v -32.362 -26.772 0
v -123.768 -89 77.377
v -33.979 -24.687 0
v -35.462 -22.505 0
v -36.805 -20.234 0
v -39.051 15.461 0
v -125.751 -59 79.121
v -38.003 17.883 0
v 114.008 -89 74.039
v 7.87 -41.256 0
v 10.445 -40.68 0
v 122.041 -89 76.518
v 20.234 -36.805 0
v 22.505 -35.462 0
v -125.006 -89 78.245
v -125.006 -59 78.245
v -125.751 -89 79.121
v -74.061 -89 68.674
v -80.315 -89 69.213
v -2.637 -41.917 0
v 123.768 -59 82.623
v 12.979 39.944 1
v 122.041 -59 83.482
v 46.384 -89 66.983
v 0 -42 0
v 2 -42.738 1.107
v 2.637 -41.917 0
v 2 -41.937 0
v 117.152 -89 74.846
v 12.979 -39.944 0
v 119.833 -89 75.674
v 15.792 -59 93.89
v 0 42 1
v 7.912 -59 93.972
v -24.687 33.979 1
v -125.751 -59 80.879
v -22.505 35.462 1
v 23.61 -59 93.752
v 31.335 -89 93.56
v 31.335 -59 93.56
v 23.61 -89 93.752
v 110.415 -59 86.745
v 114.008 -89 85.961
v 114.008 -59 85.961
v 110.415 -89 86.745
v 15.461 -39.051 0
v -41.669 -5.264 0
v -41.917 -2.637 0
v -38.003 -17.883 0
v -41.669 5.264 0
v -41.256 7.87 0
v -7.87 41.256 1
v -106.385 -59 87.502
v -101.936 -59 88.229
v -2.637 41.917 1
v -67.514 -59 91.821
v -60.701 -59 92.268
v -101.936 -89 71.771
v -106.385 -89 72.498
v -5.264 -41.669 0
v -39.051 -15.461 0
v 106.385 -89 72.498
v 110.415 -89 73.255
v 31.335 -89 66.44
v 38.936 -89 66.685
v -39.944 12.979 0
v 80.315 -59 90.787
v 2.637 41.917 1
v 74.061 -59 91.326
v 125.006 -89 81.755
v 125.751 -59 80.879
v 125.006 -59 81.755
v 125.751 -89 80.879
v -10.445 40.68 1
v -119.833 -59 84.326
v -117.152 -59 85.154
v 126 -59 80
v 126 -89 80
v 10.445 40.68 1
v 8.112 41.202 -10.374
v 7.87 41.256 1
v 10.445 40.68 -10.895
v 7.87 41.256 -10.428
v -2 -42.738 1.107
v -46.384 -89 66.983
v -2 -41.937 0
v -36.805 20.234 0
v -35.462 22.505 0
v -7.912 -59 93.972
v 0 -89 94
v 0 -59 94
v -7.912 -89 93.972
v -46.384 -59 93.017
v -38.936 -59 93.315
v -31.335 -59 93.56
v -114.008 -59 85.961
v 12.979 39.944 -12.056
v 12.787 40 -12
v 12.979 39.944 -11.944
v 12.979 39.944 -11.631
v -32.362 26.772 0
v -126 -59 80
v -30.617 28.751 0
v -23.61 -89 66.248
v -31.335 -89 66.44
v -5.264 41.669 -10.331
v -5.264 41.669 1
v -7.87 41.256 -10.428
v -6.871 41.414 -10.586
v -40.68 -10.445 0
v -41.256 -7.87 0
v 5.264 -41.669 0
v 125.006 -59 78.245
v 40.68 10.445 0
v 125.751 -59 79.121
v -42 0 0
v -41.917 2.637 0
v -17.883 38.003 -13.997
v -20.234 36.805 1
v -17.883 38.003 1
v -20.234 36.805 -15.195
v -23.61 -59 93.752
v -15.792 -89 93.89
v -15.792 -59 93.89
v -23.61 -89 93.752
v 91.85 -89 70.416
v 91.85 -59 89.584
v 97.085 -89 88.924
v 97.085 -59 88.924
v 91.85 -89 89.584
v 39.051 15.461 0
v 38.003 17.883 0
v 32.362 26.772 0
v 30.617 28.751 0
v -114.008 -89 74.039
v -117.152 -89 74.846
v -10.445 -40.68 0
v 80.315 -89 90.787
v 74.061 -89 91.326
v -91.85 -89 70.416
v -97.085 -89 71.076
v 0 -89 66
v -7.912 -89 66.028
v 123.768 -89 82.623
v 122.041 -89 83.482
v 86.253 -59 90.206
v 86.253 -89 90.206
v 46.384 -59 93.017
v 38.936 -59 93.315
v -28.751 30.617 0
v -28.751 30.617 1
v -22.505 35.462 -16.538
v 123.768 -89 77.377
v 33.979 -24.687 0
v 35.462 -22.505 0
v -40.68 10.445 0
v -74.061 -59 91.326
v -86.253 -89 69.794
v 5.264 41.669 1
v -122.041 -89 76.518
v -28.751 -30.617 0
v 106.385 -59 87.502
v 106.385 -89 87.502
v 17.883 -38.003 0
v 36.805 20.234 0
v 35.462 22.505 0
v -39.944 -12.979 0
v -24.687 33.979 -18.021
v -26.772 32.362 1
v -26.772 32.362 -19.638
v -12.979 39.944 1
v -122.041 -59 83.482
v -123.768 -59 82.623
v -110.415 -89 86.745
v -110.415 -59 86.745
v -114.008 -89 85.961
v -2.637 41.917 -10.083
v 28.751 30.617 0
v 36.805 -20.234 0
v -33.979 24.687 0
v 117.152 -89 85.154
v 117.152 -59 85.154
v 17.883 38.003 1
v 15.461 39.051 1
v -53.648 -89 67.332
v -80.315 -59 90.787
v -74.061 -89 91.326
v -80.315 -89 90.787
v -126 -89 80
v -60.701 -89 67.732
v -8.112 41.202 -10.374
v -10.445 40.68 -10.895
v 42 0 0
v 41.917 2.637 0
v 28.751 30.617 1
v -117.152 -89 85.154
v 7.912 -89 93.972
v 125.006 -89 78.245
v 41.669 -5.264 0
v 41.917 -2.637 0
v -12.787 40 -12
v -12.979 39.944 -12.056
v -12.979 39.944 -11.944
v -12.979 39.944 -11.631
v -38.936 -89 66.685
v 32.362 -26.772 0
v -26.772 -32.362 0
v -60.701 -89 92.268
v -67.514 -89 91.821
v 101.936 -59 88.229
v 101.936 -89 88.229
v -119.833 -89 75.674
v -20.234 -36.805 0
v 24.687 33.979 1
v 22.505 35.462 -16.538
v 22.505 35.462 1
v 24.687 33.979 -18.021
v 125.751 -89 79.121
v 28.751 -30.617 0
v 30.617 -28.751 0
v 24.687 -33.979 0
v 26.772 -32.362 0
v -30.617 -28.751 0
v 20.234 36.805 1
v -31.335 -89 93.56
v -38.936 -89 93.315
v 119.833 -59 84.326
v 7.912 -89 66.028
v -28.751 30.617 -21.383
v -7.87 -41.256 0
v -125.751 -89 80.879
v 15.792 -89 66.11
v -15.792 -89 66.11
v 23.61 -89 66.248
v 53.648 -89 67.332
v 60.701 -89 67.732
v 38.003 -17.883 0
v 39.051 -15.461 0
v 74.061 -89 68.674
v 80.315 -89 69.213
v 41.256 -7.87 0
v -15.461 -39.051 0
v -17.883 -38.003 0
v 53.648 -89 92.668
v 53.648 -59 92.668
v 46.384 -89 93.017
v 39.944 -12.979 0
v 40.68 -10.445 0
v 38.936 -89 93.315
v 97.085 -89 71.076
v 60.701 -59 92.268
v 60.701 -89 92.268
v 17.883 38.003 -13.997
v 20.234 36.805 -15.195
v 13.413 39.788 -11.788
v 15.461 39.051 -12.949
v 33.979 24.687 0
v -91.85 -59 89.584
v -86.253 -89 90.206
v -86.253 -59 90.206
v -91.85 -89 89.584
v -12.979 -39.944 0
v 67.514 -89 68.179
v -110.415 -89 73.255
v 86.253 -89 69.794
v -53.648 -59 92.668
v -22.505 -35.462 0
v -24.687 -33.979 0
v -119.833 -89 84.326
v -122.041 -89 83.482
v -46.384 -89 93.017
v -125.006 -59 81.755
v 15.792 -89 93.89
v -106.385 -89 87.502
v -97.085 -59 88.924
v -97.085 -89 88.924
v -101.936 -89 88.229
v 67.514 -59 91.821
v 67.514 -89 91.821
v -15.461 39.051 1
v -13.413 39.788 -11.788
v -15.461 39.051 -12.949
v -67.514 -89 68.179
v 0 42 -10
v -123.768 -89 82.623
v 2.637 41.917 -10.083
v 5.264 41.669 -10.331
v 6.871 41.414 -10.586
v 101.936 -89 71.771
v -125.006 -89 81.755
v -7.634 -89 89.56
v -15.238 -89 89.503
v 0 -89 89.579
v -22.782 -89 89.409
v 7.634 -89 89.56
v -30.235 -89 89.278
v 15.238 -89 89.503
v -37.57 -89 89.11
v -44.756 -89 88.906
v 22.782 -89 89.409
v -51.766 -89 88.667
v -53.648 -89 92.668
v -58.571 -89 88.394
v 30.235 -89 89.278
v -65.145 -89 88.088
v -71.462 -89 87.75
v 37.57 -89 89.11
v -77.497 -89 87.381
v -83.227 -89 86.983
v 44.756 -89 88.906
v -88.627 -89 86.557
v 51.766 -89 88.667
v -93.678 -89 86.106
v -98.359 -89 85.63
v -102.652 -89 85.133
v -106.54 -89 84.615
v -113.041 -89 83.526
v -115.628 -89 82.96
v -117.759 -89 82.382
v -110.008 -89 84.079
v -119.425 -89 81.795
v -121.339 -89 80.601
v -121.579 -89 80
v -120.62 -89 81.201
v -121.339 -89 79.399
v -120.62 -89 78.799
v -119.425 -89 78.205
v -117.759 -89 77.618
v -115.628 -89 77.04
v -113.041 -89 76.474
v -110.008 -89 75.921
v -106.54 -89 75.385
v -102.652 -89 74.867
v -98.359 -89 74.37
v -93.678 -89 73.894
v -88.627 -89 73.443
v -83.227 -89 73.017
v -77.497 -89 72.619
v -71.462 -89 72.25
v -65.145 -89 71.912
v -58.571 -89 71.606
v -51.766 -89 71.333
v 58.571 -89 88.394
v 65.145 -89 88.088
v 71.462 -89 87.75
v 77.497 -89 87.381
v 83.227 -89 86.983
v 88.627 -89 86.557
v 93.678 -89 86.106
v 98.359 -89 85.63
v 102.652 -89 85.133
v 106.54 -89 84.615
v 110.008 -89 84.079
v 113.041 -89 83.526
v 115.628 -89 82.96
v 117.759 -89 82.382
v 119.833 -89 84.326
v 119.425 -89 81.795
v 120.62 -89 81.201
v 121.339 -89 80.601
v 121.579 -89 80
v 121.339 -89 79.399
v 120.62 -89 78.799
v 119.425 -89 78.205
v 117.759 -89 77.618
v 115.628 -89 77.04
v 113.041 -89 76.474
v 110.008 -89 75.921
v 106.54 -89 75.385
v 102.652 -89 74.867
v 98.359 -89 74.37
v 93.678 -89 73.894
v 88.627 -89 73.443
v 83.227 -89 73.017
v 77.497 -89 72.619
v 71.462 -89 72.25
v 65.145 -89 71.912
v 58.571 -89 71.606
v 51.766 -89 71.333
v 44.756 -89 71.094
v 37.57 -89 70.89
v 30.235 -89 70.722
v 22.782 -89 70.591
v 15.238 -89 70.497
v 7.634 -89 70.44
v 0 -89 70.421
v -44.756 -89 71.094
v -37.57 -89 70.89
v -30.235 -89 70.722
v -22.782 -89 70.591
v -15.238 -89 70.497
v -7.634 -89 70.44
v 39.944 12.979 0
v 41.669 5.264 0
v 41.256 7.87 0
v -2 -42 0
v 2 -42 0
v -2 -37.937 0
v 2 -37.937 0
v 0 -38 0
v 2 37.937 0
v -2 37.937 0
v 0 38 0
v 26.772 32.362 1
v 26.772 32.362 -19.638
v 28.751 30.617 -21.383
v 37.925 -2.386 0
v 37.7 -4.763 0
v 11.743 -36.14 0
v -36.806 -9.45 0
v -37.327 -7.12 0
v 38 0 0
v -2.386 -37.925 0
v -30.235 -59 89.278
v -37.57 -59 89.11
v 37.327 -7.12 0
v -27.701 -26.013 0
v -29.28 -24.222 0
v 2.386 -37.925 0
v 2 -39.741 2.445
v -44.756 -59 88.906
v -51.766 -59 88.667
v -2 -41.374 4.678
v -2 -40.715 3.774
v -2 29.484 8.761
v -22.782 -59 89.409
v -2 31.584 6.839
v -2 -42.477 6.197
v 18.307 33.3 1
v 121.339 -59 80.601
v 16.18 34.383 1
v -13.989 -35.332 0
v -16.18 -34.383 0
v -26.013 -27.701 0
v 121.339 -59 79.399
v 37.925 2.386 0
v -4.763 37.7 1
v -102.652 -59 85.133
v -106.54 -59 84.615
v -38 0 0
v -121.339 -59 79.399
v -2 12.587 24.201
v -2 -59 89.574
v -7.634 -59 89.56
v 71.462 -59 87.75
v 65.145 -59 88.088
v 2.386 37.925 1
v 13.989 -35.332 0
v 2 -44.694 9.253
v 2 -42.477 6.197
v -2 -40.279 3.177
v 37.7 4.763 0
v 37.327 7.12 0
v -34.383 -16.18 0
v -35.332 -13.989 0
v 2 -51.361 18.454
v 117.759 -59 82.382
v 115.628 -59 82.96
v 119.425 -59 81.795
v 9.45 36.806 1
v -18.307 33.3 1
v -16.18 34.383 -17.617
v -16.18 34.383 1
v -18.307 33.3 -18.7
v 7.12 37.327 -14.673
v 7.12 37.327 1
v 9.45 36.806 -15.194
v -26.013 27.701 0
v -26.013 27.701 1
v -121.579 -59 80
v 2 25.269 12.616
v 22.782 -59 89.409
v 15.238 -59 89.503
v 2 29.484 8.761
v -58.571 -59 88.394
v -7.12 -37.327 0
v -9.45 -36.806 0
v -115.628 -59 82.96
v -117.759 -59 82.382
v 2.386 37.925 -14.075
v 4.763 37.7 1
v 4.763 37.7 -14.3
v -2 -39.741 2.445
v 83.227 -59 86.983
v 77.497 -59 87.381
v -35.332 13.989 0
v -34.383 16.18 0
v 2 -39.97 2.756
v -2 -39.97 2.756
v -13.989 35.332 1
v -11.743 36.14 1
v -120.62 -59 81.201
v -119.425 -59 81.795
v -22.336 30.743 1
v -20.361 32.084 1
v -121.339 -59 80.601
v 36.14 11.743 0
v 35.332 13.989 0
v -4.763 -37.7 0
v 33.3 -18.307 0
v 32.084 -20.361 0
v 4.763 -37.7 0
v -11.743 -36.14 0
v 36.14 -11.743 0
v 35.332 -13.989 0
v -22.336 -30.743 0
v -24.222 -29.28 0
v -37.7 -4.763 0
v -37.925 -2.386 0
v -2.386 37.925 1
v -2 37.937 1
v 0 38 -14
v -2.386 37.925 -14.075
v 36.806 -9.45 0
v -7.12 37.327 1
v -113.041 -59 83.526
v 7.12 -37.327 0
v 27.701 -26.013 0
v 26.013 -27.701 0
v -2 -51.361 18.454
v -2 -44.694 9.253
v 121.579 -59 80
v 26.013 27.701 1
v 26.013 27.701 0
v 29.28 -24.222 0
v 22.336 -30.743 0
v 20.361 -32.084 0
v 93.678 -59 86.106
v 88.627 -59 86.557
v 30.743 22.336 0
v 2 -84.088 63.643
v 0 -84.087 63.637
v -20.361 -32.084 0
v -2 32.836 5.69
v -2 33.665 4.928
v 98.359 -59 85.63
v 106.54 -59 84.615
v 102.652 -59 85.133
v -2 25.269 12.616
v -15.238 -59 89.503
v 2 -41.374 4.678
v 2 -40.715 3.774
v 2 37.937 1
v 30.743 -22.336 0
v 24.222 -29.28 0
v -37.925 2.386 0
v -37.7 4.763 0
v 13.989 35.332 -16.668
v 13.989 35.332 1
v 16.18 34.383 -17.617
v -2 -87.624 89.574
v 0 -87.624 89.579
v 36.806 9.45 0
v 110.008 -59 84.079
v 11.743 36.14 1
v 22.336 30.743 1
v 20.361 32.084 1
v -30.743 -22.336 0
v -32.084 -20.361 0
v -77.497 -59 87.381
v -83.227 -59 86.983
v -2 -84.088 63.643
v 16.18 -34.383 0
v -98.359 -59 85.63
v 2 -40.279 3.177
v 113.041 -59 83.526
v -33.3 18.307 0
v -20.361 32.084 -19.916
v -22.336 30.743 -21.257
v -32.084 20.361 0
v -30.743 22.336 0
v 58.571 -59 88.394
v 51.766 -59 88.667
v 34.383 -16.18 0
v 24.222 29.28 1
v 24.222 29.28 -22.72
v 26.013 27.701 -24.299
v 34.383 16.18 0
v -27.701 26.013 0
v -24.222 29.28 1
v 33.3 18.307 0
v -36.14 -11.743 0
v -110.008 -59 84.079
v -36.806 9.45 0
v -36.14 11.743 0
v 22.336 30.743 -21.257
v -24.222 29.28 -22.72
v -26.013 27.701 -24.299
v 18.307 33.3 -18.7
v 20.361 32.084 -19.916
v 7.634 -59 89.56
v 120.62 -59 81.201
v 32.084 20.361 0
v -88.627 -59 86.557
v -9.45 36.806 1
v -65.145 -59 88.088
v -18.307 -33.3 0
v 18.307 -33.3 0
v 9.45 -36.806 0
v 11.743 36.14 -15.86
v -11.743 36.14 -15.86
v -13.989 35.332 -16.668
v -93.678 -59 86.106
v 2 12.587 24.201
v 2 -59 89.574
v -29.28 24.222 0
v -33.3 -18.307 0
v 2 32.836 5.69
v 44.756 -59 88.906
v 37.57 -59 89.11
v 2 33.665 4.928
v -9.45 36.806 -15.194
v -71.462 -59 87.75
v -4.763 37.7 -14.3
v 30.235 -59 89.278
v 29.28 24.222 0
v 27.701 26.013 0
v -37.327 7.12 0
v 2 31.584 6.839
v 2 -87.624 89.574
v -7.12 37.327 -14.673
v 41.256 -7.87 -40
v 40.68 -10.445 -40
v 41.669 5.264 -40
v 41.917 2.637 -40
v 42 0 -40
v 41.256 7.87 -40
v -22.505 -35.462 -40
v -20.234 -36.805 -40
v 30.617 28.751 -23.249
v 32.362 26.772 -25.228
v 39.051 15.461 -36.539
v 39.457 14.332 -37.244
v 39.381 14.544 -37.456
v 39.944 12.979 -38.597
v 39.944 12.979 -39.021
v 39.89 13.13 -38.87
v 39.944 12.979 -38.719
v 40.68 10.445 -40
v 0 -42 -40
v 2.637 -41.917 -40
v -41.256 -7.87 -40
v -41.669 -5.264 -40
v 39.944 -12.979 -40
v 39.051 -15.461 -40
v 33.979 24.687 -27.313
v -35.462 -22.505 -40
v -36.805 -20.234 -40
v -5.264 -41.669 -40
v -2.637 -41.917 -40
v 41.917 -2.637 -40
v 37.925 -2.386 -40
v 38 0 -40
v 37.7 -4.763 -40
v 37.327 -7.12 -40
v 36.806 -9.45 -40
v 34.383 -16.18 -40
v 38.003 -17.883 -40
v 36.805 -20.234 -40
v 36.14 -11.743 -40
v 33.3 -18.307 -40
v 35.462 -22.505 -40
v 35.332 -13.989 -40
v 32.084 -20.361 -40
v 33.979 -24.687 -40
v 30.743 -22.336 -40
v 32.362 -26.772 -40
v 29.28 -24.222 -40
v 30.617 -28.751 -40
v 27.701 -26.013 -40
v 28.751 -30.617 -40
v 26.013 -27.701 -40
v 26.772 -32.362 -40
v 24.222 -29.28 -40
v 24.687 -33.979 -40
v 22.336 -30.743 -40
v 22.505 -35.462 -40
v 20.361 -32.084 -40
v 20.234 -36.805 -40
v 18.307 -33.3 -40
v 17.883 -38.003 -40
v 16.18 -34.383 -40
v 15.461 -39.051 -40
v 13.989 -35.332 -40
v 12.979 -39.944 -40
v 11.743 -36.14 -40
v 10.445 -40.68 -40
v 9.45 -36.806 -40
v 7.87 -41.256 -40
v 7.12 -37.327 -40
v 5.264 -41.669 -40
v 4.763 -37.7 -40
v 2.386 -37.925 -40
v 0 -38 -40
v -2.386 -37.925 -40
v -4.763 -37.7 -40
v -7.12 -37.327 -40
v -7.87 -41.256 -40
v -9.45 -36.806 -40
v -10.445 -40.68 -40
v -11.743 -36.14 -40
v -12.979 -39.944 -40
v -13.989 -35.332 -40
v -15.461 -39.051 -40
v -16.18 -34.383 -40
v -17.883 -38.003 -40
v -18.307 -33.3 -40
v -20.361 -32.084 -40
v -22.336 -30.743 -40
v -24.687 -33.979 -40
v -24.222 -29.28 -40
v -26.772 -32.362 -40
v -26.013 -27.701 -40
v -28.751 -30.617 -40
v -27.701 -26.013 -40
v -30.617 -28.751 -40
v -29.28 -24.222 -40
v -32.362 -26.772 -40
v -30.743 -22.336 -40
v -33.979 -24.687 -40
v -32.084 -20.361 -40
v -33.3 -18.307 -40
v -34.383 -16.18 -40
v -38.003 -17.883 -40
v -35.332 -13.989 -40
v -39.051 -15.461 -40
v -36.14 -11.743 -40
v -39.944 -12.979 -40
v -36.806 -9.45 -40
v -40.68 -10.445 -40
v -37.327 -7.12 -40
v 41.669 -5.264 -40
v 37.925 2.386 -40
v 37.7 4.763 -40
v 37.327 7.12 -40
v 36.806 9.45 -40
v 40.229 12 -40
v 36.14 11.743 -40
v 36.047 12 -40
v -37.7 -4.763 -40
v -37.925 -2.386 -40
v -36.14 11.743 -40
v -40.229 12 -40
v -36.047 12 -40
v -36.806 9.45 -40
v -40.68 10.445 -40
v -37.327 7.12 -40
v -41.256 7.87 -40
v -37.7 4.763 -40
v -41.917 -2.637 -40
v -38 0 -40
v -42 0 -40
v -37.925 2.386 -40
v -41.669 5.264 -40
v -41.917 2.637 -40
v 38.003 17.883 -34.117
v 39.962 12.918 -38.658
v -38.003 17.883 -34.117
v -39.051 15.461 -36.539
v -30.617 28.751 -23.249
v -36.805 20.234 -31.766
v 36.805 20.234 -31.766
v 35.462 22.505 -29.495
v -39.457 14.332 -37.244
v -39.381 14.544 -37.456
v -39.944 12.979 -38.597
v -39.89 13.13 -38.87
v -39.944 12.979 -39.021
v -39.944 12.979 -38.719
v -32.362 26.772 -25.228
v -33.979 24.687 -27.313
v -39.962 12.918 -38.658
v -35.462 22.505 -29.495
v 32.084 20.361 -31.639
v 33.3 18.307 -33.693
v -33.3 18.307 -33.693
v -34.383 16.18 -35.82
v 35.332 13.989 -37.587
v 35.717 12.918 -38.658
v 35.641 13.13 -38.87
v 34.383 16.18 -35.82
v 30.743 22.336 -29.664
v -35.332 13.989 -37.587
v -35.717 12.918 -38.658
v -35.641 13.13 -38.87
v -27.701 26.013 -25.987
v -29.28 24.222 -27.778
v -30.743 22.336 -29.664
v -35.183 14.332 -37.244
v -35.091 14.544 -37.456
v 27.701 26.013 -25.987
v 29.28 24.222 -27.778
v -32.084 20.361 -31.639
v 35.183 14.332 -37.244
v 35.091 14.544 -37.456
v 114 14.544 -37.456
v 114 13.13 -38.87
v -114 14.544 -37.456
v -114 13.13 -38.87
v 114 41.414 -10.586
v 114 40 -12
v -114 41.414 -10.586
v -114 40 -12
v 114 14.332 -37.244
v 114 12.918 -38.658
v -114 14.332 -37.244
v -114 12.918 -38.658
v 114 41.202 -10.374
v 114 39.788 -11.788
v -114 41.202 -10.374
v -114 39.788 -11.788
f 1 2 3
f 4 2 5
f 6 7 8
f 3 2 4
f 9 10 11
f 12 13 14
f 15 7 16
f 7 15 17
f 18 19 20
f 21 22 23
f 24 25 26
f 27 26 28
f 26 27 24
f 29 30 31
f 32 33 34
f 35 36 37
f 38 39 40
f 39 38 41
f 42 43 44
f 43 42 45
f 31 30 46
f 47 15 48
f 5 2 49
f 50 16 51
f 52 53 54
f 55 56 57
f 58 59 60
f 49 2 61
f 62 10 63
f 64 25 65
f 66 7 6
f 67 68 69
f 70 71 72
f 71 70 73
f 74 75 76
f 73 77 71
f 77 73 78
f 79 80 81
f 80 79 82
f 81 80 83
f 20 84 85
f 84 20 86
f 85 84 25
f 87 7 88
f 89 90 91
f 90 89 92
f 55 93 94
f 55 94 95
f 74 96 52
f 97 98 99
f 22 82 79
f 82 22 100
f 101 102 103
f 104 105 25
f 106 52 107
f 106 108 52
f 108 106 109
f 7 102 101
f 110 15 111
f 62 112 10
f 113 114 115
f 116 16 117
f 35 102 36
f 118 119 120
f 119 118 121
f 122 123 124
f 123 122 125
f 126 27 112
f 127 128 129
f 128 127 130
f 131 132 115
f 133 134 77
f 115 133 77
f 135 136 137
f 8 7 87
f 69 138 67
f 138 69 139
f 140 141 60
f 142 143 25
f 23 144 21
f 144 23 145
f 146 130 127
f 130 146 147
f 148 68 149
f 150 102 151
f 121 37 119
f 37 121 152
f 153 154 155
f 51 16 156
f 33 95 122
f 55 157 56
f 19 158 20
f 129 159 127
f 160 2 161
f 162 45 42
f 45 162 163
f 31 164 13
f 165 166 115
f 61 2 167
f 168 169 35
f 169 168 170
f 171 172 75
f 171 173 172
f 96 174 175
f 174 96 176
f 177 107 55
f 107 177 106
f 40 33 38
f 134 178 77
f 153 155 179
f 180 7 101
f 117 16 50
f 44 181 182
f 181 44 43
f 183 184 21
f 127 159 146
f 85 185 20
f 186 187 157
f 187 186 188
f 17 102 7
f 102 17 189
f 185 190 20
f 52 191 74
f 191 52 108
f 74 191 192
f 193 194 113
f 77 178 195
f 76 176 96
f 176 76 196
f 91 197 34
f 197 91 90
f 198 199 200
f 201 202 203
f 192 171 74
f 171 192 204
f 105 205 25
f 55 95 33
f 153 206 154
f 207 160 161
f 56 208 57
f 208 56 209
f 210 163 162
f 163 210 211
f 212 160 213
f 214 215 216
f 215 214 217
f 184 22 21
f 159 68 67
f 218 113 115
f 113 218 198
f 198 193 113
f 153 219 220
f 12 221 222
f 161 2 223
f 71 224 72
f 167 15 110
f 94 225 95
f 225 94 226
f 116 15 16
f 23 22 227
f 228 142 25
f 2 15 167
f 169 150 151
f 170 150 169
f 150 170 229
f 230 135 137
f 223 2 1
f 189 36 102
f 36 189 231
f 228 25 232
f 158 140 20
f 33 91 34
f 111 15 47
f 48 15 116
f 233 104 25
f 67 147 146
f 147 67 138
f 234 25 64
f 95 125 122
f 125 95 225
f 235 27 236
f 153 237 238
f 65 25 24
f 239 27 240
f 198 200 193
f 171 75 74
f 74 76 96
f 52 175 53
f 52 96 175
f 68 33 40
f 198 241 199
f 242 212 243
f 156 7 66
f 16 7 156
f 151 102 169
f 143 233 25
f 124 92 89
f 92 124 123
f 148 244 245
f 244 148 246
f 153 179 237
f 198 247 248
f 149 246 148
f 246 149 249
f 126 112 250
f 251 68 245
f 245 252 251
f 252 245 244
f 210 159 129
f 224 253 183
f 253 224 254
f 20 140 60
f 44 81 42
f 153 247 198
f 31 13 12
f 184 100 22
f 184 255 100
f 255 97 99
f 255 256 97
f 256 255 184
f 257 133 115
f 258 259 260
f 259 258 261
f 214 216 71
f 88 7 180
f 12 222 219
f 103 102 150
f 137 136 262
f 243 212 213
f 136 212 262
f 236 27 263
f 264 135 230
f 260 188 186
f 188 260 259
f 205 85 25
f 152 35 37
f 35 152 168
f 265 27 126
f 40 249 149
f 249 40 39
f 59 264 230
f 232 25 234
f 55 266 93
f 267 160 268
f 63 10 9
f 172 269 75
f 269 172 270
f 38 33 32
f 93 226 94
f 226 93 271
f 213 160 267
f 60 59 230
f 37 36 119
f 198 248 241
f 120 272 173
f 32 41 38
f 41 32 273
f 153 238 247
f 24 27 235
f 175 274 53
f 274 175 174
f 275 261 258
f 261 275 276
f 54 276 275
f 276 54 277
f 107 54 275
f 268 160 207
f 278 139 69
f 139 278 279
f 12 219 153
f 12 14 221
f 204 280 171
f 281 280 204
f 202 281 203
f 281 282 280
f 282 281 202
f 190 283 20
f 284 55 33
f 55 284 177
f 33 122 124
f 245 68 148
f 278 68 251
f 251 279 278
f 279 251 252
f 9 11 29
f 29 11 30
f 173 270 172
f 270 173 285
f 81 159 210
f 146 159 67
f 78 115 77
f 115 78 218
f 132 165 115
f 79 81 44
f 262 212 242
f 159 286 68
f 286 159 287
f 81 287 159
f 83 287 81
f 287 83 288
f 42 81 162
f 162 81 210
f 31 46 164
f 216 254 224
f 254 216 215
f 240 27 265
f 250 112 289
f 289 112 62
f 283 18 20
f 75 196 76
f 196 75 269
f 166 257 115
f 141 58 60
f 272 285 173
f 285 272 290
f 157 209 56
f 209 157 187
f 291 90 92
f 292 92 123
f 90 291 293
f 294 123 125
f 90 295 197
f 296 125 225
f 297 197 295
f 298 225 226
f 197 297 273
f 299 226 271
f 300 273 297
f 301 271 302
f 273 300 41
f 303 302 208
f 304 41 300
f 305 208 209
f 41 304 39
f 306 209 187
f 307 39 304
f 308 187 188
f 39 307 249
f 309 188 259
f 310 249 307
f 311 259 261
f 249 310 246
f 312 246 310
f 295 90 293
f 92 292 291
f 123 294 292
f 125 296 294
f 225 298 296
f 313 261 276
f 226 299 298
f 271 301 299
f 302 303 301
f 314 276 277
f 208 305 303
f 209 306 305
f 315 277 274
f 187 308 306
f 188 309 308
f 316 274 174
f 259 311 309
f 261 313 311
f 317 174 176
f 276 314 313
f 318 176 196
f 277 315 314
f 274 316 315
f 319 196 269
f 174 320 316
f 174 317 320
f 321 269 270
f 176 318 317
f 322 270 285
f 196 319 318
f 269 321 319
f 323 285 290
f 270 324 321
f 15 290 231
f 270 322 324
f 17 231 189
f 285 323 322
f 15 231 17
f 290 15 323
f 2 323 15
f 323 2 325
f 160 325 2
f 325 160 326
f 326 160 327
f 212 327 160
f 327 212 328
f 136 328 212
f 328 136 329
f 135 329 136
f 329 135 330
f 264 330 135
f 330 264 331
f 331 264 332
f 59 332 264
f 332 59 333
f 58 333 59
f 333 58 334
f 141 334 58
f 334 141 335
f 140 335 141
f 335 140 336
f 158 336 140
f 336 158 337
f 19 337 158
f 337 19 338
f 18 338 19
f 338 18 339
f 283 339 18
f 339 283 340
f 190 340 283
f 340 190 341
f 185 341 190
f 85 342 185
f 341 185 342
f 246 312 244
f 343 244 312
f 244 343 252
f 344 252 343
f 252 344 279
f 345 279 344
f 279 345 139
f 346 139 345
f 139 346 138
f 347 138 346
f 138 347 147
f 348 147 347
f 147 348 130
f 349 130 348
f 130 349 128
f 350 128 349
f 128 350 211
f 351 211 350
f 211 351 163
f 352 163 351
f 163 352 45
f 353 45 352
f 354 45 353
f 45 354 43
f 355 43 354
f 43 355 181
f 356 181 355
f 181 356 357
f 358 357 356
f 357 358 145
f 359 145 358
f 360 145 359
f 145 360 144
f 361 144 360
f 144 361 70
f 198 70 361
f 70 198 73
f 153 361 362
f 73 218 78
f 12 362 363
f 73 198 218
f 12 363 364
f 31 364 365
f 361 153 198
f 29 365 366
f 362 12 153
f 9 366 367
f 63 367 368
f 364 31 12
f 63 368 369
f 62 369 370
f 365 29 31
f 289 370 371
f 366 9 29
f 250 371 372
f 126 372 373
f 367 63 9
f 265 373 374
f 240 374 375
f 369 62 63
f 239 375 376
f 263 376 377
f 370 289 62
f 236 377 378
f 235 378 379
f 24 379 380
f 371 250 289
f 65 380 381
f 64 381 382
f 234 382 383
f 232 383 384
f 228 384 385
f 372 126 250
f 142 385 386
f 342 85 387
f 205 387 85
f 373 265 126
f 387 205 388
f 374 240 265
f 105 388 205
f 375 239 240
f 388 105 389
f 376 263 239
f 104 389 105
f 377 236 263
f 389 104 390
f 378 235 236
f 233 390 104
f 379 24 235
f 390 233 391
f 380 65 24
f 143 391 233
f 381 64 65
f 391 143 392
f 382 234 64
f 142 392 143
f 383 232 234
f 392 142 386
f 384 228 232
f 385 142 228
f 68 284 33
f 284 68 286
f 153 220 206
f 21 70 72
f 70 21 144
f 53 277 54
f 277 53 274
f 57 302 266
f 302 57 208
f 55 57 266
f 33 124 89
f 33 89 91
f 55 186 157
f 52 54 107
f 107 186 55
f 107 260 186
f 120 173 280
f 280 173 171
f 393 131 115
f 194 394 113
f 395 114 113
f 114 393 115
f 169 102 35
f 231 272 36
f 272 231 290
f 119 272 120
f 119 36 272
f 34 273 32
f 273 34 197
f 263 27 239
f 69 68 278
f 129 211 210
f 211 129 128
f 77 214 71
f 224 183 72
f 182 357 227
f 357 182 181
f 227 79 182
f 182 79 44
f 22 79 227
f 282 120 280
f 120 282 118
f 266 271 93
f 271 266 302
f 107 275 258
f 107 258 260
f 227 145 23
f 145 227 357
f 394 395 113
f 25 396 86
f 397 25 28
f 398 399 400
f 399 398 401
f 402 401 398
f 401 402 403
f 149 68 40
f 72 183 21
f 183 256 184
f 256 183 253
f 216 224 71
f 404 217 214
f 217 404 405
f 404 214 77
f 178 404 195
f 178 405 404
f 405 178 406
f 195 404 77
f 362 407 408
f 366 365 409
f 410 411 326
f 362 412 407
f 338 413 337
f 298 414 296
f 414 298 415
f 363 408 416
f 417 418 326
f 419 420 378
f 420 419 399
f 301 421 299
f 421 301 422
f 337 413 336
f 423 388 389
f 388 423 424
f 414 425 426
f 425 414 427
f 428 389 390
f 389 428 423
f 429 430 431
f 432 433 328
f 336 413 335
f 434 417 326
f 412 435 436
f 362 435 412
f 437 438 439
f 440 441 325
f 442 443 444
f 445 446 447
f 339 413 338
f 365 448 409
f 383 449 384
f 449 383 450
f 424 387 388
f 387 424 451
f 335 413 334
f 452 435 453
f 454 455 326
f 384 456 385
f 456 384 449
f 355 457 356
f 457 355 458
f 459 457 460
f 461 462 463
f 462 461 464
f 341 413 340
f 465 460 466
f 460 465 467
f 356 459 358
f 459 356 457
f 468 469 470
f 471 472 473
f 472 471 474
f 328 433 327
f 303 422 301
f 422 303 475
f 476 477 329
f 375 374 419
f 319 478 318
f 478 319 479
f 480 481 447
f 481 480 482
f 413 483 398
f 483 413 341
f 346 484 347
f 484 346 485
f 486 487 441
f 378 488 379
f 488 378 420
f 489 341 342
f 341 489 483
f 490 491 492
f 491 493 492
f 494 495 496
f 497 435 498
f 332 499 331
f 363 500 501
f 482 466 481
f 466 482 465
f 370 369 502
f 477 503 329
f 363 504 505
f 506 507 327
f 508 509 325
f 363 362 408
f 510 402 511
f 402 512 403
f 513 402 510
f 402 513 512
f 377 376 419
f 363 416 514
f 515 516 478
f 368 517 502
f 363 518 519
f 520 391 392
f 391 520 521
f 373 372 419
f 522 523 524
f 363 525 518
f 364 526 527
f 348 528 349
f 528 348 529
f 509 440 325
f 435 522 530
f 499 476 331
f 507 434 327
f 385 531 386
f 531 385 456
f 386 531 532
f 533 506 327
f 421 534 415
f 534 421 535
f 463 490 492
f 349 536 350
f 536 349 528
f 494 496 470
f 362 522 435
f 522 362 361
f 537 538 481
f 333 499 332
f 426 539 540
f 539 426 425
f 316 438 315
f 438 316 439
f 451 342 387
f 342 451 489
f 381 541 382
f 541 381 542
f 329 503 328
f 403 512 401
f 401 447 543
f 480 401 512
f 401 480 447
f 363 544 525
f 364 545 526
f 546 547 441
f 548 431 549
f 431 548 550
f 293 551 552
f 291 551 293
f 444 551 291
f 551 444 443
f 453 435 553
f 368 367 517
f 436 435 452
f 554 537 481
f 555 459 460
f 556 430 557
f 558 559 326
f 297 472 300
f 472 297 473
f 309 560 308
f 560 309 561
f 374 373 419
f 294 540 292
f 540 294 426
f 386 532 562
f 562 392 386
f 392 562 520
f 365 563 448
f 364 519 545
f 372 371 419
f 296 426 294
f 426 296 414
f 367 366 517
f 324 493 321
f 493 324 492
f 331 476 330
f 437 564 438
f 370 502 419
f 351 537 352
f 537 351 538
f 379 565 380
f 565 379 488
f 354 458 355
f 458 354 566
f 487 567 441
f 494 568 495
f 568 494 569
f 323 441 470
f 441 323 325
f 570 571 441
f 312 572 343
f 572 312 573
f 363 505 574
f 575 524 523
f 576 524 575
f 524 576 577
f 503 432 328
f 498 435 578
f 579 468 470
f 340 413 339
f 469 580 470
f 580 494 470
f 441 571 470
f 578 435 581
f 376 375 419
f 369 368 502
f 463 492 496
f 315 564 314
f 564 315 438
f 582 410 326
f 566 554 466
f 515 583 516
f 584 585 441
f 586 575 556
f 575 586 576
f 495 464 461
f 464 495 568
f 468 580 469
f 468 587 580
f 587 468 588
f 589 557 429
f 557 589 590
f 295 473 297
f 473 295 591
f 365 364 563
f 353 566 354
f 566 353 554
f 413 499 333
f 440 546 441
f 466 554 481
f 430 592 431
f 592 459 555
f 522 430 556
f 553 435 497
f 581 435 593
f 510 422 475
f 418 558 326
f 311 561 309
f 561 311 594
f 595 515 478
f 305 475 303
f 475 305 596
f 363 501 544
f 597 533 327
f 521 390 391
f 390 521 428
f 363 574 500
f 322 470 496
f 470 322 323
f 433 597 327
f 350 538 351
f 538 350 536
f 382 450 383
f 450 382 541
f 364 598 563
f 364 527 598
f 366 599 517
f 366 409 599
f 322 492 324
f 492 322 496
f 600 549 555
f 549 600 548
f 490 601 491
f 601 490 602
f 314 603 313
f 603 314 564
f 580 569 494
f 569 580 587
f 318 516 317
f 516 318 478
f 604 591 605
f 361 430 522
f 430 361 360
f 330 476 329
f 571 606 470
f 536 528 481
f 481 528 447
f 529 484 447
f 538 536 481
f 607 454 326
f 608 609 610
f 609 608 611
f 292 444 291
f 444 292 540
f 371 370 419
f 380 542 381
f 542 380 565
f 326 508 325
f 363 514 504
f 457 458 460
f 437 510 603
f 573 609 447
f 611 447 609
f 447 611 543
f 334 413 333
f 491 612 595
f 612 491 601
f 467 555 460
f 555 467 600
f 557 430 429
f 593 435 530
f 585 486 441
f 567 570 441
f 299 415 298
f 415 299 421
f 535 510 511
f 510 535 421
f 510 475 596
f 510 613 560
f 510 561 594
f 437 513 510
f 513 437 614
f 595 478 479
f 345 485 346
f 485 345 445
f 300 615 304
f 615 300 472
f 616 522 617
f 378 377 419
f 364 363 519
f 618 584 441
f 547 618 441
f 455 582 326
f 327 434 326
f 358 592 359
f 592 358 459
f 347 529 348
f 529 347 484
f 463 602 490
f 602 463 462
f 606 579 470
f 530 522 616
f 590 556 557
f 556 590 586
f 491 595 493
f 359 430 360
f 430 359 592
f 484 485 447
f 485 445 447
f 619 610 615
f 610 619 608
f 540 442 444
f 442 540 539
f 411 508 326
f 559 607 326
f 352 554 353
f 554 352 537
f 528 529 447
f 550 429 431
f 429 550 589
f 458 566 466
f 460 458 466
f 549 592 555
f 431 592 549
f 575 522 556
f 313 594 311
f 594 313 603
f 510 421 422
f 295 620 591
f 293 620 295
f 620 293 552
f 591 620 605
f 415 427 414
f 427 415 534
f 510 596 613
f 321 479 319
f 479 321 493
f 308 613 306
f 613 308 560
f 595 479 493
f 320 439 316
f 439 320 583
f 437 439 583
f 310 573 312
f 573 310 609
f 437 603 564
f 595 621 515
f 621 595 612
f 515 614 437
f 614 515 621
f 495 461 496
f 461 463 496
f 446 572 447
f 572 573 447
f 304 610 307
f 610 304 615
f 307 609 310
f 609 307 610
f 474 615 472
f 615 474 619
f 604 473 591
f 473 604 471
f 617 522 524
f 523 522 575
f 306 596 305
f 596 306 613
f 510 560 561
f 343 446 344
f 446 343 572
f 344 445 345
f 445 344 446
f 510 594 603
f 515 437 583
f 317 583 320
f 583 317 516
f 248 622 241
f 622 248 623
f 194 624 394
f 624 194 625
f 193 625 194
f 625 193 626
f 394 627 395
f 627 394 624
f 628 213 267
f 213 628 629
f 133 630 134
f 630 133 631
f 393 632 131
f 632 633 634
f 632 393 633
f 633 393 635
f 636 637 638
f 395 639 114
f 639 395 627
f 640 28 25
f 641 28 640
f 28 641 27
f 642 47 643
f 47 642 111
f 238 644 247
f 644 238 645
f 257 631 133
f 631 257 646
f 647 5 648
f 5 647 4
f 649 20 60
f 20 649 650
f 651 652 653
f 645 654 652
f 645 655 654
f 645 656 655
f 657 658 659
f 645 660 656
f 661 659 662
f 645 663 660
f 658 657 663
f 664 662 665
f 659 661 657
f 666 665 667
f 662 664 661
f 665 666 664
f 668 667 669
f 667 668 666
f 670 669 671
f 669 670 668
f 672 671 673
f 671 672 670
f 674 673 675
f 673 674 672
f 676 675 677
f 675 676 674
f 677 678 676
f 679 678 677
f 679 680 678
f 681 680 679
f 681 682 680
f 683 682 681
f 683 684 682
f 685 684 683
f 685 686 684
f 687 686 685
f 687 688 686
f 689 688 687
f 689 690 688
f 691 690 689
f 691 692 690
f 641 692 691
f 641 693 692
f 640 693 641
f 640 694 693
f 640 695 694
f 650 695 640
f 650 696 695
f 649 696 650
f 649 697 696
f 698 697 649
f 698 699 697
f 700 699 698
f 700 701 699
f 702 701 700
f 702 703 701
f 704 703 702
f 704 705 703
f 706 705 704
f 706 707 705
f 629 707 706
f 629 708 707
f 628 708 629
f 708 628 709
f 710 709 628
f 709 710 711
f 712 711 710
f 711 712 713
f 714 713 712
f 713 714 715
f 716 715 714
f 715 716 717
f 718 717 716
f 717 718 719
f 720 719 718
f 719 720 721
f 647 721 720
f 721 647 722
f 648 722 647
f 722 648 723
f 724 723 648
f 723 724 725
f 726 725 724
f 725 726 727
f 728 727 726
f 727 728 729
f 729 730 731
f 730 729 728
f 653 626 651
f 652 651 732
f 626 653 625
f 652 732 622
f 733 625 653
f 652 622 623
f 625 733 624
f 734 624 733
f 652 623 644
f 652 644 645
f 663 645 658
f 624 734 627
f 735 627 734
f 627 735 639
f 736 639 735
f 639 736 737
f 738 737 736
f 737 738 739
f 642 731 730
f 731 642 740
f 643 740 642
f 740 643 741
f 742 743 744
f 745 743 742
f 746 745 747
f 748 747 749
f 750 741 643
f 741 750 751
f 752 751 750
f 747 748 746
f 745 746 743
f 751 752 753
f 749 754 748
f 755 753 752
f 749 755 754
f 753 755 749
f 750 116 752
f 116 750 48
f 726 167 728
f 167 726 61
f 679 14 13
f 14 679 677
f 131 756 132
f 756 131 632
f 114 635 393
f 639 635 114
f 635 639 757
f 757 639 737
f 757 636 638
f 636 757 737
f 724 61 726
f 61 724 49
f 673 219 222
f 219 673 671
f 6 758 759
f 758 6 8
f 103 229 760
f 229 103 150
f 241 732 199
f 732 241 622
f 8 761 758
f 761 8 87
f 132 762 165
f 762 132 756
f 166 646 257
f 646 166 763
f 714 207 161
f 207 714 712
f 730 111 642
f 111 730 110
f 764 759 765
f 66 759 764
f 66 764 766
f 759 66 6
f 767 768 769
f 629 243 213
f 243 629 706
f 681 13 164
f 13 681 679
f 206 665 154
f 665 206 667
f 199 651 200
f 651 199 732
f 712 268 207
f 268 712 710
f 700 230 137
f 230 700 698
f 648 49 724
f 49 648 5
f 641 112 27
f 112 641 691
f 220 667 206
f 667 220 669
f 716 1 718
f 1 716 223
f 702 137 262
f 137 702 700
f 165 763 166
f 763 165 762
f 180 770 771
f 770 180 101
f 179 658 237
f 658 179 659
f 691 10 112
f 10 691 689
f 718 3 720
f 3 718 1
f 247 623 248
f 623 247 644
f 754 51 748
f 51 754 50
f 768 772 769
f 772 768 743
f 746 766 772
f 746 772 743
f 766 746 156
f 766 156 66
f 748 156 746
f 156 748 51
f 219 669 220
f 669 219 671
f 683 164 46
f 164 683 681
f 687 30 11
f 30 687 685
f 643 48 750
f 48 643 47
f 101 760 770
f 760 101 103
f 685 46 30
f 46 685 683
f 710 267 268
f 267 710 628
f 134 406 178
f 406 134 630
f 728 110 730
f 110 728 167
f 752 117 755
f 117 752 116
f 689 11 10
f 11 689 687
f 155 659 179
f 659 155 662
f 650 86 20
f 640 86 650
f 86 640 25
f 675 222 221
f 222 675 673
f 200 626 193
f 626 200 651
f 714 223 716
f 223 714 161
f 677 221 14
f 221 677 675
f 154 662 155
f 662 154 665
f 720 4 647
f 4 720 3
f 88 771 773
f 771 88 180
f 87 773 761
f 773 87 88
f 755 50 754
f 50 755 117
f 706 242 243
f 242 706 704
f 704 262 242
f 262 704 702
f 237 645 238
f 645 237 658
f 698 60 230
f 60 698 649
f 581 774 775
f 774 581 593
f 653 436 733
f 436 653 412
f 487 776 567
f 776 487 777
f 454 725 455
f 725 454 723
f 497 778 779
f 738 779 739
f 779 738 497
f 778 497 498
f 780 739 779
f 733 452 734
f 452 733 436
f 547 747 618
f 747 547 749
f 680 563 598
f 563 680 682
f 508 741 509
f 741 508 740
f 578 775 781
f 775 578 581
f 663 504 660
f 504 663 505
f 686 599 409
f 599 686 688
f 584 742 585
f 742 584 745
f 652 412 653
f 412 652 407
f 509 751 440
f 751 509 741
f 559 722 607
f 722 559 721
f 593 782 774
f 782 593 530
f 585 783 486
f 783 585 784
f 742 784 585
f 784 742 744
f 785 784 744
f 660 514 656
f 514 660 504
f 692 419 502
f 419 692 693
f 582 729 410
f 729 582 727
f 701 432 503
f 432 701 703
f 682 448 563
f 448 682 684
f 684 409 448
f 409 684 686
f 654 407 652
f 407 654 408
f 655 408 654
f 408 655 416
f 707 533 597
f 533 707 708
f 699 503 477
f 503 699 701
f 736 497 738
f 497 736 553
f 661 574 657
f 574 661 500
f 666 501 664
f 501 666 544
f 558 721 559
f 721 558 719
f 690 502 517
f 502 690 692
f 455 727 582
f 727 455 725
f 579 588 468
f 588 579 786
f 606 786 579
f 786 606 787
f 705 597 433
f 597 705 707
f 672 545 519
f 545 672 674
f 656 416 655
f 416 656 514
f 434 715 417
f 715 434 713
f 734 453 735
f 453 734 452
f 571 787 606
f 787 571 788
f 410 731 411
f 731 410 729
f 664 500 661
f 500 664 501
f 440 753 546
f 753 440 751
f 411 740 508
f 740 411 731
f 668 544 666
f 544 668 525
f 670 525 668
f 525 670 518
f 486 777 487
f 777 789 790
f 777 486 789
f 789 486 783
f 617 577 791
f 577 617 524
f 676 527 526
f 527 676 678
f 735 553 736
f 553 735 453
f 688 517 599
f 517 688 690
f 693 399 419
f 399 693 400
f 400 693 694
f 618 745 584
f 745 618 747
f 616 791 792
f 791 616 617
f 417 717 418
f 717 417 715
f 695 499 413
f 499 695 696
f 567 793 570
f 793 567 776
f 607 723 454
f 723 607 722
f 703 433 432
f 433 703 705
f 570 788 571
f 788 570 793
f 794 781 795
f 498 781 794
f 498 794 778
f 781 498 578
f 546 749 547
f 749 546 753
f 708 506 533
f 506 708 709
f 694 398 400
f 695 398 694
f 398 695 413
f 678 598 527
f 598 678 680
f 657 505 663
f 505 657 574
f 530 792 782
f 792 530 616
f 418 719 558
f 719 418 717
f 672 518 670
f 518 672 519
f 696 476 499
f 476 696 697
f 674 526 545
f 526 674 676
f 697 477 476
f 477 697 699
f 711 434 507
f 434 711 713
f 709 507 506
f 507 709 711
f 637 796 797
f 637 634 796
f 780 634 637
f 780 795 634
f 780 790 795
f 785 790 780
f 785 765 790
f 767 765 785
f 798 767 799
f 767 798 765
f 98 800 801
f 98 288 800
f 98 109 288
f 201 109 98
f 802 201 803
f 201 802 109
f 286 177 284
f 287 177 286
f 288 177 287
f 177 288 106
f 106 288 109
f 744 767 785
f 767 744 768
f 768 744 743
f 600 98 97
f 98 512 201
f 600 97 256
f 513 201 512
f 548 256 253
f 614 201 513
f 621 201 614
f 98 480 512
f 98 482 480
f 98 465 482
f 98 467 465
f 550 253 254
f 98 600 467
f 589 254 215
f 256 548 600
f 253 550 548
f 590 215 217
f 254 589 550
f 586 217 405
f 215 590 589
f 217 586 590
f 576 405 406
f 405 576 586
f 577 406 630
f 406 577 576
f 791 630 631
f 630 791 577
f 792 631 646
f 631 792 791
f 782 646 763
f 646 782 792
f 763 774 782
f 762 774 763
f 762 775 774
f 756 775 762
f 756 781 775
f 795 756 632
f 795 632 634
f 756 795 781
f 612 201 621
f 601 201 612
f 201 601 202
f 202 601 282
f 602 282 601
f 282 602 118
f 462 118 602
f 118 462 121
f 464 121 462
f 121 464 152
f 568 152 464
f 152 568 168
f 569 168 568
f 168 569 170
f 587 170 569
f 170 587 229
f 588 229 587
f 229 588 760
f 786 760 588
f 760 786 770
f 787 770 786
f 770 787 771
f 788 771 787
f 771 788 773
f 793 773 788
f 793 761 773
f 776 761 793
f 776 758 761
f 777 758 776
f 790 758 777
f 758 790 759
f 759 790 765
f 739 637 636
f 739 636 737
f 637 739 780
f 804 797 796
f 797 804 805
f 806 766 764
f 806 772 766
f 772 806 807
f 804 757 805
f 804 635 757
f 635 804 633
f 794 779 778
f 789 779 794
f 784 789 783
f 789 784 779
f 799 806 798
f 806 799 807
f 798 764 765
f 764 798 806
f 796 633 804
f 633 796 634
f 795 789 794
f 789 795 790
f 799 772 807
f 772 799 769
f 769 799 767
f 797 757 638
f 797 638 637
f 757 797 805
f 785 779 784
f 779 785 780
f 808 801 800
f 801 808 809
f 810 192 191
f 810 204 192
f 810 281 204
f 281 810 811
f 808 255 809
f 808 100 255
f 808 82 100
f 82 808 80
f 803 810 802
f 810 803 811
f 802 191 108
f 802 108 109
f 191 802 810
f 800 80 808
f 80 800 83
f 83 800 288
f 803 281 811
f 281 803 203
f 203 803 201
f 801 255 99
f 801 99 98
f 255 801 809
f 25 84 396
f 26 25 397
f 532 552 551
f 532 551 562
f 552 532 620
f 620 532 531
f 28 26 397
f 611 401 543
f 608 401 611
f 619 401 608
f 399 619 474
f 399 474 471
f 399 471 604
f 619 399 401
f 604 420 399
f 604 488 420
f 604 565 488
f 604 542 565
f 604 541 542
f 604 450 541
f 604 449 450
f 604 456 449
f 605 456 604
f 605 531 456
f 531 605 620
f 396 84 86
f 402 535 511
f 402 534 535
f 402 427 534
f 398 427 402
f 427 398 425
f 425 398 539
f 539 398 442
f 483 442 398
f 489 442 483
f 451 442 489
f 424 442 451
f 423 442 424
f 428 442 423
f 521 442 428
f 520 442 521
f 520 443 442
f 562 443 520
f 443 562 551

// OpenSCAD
pipeOD = 76;
minPipeOverlap = 10;
pipeOverlap = 40;
wallThickness = 4;
faceDepth = 30;
faceSquashFactor = 3;
faceForward = 10;
$fn=100;

difference() {
    // outer shell from the top of the pipe to the face
    hull() {
        cylinder(h = 1, r = pipeOD/2+wallThickness);
        
        rotate([90,0,0])
        translate([0,80,faceDepth+pipeOD/4+faceForward])
        scale([faceSquashFactor, 1/faceSquashFactor, 1])
        cylinder(h=faceDepth, r=pipeOD/2+wallThickness);
    }

    // inner shell for the airflow path
    hull() {
        cylinder(h = 1, r = pipeOD/2);
        
        rotate([90,0,0])
        translate([0,80,faceDepth+pipeOD/4+faceForward])
        scale([faceSquashFactor*(pipeOD/2-wallThickness/faceSquashFactor)/(pipeOD/2), 1/faceSquashFactor*(pipeOD/2-wallThickness*faceSquashFactor)/(pipeOD/2), 1])
        cylinder(h=faceDepth, r=pipeOD/2+wallThickness);
    }
};

// angled base for 3d printing and pipe connection
difference() {
    translate([0,0,-pipeOverlap])
    difference() {
        cylinder(h = pipeOverlap, r = pipeOD/2+wallThickness);
        cylinder(h = pipeOverlap, r = pipeOD/2);
    }

    translate([0, pipeOD/2+wallThickness, -minPipeOverlap])
    rotate([-45,0,0])
    translate([-pipeOD,0,-pipeOD*2])
    cube(pipeOD*2);
    
}


// internal brace to keep the face from squashing
// these dimensions are wrong
#hull() {
translate([-wallThickness/2, -pipeOD/2-wallThickness, 0])
#cube([wallThickness, pipeOD+wallThickness, 1]);

translate([-wallThickness/2,-80-wallThickness*2, faceDepth+pipeOD/4+faceForward+pipeOD/faceSquashFactor+wallThickness*2])
cube([wallThickness, faceDepth-wallThickness, 1]);
    translate([-wallThickness/2,-80-wallThickness, faceDepth+pipeOD/4+faceForward+wallThickness])
cube([wallThickness, faceDepth+1, 1]);
    
}


// base lines to get a better grab on the bed
translate([0,pipeOD/2+wallThickness-2,-minPipeOverlap-2])
rotate([45,0,0]) {
translate([-pipeOD*1.5, -pipeOD/2,0])
cube([pipeOD*3, 2, 0.3]);

translate([-pipeOD*1.5, 0,0])
cube([pipeOD*3, 2, 0.3]);
}
